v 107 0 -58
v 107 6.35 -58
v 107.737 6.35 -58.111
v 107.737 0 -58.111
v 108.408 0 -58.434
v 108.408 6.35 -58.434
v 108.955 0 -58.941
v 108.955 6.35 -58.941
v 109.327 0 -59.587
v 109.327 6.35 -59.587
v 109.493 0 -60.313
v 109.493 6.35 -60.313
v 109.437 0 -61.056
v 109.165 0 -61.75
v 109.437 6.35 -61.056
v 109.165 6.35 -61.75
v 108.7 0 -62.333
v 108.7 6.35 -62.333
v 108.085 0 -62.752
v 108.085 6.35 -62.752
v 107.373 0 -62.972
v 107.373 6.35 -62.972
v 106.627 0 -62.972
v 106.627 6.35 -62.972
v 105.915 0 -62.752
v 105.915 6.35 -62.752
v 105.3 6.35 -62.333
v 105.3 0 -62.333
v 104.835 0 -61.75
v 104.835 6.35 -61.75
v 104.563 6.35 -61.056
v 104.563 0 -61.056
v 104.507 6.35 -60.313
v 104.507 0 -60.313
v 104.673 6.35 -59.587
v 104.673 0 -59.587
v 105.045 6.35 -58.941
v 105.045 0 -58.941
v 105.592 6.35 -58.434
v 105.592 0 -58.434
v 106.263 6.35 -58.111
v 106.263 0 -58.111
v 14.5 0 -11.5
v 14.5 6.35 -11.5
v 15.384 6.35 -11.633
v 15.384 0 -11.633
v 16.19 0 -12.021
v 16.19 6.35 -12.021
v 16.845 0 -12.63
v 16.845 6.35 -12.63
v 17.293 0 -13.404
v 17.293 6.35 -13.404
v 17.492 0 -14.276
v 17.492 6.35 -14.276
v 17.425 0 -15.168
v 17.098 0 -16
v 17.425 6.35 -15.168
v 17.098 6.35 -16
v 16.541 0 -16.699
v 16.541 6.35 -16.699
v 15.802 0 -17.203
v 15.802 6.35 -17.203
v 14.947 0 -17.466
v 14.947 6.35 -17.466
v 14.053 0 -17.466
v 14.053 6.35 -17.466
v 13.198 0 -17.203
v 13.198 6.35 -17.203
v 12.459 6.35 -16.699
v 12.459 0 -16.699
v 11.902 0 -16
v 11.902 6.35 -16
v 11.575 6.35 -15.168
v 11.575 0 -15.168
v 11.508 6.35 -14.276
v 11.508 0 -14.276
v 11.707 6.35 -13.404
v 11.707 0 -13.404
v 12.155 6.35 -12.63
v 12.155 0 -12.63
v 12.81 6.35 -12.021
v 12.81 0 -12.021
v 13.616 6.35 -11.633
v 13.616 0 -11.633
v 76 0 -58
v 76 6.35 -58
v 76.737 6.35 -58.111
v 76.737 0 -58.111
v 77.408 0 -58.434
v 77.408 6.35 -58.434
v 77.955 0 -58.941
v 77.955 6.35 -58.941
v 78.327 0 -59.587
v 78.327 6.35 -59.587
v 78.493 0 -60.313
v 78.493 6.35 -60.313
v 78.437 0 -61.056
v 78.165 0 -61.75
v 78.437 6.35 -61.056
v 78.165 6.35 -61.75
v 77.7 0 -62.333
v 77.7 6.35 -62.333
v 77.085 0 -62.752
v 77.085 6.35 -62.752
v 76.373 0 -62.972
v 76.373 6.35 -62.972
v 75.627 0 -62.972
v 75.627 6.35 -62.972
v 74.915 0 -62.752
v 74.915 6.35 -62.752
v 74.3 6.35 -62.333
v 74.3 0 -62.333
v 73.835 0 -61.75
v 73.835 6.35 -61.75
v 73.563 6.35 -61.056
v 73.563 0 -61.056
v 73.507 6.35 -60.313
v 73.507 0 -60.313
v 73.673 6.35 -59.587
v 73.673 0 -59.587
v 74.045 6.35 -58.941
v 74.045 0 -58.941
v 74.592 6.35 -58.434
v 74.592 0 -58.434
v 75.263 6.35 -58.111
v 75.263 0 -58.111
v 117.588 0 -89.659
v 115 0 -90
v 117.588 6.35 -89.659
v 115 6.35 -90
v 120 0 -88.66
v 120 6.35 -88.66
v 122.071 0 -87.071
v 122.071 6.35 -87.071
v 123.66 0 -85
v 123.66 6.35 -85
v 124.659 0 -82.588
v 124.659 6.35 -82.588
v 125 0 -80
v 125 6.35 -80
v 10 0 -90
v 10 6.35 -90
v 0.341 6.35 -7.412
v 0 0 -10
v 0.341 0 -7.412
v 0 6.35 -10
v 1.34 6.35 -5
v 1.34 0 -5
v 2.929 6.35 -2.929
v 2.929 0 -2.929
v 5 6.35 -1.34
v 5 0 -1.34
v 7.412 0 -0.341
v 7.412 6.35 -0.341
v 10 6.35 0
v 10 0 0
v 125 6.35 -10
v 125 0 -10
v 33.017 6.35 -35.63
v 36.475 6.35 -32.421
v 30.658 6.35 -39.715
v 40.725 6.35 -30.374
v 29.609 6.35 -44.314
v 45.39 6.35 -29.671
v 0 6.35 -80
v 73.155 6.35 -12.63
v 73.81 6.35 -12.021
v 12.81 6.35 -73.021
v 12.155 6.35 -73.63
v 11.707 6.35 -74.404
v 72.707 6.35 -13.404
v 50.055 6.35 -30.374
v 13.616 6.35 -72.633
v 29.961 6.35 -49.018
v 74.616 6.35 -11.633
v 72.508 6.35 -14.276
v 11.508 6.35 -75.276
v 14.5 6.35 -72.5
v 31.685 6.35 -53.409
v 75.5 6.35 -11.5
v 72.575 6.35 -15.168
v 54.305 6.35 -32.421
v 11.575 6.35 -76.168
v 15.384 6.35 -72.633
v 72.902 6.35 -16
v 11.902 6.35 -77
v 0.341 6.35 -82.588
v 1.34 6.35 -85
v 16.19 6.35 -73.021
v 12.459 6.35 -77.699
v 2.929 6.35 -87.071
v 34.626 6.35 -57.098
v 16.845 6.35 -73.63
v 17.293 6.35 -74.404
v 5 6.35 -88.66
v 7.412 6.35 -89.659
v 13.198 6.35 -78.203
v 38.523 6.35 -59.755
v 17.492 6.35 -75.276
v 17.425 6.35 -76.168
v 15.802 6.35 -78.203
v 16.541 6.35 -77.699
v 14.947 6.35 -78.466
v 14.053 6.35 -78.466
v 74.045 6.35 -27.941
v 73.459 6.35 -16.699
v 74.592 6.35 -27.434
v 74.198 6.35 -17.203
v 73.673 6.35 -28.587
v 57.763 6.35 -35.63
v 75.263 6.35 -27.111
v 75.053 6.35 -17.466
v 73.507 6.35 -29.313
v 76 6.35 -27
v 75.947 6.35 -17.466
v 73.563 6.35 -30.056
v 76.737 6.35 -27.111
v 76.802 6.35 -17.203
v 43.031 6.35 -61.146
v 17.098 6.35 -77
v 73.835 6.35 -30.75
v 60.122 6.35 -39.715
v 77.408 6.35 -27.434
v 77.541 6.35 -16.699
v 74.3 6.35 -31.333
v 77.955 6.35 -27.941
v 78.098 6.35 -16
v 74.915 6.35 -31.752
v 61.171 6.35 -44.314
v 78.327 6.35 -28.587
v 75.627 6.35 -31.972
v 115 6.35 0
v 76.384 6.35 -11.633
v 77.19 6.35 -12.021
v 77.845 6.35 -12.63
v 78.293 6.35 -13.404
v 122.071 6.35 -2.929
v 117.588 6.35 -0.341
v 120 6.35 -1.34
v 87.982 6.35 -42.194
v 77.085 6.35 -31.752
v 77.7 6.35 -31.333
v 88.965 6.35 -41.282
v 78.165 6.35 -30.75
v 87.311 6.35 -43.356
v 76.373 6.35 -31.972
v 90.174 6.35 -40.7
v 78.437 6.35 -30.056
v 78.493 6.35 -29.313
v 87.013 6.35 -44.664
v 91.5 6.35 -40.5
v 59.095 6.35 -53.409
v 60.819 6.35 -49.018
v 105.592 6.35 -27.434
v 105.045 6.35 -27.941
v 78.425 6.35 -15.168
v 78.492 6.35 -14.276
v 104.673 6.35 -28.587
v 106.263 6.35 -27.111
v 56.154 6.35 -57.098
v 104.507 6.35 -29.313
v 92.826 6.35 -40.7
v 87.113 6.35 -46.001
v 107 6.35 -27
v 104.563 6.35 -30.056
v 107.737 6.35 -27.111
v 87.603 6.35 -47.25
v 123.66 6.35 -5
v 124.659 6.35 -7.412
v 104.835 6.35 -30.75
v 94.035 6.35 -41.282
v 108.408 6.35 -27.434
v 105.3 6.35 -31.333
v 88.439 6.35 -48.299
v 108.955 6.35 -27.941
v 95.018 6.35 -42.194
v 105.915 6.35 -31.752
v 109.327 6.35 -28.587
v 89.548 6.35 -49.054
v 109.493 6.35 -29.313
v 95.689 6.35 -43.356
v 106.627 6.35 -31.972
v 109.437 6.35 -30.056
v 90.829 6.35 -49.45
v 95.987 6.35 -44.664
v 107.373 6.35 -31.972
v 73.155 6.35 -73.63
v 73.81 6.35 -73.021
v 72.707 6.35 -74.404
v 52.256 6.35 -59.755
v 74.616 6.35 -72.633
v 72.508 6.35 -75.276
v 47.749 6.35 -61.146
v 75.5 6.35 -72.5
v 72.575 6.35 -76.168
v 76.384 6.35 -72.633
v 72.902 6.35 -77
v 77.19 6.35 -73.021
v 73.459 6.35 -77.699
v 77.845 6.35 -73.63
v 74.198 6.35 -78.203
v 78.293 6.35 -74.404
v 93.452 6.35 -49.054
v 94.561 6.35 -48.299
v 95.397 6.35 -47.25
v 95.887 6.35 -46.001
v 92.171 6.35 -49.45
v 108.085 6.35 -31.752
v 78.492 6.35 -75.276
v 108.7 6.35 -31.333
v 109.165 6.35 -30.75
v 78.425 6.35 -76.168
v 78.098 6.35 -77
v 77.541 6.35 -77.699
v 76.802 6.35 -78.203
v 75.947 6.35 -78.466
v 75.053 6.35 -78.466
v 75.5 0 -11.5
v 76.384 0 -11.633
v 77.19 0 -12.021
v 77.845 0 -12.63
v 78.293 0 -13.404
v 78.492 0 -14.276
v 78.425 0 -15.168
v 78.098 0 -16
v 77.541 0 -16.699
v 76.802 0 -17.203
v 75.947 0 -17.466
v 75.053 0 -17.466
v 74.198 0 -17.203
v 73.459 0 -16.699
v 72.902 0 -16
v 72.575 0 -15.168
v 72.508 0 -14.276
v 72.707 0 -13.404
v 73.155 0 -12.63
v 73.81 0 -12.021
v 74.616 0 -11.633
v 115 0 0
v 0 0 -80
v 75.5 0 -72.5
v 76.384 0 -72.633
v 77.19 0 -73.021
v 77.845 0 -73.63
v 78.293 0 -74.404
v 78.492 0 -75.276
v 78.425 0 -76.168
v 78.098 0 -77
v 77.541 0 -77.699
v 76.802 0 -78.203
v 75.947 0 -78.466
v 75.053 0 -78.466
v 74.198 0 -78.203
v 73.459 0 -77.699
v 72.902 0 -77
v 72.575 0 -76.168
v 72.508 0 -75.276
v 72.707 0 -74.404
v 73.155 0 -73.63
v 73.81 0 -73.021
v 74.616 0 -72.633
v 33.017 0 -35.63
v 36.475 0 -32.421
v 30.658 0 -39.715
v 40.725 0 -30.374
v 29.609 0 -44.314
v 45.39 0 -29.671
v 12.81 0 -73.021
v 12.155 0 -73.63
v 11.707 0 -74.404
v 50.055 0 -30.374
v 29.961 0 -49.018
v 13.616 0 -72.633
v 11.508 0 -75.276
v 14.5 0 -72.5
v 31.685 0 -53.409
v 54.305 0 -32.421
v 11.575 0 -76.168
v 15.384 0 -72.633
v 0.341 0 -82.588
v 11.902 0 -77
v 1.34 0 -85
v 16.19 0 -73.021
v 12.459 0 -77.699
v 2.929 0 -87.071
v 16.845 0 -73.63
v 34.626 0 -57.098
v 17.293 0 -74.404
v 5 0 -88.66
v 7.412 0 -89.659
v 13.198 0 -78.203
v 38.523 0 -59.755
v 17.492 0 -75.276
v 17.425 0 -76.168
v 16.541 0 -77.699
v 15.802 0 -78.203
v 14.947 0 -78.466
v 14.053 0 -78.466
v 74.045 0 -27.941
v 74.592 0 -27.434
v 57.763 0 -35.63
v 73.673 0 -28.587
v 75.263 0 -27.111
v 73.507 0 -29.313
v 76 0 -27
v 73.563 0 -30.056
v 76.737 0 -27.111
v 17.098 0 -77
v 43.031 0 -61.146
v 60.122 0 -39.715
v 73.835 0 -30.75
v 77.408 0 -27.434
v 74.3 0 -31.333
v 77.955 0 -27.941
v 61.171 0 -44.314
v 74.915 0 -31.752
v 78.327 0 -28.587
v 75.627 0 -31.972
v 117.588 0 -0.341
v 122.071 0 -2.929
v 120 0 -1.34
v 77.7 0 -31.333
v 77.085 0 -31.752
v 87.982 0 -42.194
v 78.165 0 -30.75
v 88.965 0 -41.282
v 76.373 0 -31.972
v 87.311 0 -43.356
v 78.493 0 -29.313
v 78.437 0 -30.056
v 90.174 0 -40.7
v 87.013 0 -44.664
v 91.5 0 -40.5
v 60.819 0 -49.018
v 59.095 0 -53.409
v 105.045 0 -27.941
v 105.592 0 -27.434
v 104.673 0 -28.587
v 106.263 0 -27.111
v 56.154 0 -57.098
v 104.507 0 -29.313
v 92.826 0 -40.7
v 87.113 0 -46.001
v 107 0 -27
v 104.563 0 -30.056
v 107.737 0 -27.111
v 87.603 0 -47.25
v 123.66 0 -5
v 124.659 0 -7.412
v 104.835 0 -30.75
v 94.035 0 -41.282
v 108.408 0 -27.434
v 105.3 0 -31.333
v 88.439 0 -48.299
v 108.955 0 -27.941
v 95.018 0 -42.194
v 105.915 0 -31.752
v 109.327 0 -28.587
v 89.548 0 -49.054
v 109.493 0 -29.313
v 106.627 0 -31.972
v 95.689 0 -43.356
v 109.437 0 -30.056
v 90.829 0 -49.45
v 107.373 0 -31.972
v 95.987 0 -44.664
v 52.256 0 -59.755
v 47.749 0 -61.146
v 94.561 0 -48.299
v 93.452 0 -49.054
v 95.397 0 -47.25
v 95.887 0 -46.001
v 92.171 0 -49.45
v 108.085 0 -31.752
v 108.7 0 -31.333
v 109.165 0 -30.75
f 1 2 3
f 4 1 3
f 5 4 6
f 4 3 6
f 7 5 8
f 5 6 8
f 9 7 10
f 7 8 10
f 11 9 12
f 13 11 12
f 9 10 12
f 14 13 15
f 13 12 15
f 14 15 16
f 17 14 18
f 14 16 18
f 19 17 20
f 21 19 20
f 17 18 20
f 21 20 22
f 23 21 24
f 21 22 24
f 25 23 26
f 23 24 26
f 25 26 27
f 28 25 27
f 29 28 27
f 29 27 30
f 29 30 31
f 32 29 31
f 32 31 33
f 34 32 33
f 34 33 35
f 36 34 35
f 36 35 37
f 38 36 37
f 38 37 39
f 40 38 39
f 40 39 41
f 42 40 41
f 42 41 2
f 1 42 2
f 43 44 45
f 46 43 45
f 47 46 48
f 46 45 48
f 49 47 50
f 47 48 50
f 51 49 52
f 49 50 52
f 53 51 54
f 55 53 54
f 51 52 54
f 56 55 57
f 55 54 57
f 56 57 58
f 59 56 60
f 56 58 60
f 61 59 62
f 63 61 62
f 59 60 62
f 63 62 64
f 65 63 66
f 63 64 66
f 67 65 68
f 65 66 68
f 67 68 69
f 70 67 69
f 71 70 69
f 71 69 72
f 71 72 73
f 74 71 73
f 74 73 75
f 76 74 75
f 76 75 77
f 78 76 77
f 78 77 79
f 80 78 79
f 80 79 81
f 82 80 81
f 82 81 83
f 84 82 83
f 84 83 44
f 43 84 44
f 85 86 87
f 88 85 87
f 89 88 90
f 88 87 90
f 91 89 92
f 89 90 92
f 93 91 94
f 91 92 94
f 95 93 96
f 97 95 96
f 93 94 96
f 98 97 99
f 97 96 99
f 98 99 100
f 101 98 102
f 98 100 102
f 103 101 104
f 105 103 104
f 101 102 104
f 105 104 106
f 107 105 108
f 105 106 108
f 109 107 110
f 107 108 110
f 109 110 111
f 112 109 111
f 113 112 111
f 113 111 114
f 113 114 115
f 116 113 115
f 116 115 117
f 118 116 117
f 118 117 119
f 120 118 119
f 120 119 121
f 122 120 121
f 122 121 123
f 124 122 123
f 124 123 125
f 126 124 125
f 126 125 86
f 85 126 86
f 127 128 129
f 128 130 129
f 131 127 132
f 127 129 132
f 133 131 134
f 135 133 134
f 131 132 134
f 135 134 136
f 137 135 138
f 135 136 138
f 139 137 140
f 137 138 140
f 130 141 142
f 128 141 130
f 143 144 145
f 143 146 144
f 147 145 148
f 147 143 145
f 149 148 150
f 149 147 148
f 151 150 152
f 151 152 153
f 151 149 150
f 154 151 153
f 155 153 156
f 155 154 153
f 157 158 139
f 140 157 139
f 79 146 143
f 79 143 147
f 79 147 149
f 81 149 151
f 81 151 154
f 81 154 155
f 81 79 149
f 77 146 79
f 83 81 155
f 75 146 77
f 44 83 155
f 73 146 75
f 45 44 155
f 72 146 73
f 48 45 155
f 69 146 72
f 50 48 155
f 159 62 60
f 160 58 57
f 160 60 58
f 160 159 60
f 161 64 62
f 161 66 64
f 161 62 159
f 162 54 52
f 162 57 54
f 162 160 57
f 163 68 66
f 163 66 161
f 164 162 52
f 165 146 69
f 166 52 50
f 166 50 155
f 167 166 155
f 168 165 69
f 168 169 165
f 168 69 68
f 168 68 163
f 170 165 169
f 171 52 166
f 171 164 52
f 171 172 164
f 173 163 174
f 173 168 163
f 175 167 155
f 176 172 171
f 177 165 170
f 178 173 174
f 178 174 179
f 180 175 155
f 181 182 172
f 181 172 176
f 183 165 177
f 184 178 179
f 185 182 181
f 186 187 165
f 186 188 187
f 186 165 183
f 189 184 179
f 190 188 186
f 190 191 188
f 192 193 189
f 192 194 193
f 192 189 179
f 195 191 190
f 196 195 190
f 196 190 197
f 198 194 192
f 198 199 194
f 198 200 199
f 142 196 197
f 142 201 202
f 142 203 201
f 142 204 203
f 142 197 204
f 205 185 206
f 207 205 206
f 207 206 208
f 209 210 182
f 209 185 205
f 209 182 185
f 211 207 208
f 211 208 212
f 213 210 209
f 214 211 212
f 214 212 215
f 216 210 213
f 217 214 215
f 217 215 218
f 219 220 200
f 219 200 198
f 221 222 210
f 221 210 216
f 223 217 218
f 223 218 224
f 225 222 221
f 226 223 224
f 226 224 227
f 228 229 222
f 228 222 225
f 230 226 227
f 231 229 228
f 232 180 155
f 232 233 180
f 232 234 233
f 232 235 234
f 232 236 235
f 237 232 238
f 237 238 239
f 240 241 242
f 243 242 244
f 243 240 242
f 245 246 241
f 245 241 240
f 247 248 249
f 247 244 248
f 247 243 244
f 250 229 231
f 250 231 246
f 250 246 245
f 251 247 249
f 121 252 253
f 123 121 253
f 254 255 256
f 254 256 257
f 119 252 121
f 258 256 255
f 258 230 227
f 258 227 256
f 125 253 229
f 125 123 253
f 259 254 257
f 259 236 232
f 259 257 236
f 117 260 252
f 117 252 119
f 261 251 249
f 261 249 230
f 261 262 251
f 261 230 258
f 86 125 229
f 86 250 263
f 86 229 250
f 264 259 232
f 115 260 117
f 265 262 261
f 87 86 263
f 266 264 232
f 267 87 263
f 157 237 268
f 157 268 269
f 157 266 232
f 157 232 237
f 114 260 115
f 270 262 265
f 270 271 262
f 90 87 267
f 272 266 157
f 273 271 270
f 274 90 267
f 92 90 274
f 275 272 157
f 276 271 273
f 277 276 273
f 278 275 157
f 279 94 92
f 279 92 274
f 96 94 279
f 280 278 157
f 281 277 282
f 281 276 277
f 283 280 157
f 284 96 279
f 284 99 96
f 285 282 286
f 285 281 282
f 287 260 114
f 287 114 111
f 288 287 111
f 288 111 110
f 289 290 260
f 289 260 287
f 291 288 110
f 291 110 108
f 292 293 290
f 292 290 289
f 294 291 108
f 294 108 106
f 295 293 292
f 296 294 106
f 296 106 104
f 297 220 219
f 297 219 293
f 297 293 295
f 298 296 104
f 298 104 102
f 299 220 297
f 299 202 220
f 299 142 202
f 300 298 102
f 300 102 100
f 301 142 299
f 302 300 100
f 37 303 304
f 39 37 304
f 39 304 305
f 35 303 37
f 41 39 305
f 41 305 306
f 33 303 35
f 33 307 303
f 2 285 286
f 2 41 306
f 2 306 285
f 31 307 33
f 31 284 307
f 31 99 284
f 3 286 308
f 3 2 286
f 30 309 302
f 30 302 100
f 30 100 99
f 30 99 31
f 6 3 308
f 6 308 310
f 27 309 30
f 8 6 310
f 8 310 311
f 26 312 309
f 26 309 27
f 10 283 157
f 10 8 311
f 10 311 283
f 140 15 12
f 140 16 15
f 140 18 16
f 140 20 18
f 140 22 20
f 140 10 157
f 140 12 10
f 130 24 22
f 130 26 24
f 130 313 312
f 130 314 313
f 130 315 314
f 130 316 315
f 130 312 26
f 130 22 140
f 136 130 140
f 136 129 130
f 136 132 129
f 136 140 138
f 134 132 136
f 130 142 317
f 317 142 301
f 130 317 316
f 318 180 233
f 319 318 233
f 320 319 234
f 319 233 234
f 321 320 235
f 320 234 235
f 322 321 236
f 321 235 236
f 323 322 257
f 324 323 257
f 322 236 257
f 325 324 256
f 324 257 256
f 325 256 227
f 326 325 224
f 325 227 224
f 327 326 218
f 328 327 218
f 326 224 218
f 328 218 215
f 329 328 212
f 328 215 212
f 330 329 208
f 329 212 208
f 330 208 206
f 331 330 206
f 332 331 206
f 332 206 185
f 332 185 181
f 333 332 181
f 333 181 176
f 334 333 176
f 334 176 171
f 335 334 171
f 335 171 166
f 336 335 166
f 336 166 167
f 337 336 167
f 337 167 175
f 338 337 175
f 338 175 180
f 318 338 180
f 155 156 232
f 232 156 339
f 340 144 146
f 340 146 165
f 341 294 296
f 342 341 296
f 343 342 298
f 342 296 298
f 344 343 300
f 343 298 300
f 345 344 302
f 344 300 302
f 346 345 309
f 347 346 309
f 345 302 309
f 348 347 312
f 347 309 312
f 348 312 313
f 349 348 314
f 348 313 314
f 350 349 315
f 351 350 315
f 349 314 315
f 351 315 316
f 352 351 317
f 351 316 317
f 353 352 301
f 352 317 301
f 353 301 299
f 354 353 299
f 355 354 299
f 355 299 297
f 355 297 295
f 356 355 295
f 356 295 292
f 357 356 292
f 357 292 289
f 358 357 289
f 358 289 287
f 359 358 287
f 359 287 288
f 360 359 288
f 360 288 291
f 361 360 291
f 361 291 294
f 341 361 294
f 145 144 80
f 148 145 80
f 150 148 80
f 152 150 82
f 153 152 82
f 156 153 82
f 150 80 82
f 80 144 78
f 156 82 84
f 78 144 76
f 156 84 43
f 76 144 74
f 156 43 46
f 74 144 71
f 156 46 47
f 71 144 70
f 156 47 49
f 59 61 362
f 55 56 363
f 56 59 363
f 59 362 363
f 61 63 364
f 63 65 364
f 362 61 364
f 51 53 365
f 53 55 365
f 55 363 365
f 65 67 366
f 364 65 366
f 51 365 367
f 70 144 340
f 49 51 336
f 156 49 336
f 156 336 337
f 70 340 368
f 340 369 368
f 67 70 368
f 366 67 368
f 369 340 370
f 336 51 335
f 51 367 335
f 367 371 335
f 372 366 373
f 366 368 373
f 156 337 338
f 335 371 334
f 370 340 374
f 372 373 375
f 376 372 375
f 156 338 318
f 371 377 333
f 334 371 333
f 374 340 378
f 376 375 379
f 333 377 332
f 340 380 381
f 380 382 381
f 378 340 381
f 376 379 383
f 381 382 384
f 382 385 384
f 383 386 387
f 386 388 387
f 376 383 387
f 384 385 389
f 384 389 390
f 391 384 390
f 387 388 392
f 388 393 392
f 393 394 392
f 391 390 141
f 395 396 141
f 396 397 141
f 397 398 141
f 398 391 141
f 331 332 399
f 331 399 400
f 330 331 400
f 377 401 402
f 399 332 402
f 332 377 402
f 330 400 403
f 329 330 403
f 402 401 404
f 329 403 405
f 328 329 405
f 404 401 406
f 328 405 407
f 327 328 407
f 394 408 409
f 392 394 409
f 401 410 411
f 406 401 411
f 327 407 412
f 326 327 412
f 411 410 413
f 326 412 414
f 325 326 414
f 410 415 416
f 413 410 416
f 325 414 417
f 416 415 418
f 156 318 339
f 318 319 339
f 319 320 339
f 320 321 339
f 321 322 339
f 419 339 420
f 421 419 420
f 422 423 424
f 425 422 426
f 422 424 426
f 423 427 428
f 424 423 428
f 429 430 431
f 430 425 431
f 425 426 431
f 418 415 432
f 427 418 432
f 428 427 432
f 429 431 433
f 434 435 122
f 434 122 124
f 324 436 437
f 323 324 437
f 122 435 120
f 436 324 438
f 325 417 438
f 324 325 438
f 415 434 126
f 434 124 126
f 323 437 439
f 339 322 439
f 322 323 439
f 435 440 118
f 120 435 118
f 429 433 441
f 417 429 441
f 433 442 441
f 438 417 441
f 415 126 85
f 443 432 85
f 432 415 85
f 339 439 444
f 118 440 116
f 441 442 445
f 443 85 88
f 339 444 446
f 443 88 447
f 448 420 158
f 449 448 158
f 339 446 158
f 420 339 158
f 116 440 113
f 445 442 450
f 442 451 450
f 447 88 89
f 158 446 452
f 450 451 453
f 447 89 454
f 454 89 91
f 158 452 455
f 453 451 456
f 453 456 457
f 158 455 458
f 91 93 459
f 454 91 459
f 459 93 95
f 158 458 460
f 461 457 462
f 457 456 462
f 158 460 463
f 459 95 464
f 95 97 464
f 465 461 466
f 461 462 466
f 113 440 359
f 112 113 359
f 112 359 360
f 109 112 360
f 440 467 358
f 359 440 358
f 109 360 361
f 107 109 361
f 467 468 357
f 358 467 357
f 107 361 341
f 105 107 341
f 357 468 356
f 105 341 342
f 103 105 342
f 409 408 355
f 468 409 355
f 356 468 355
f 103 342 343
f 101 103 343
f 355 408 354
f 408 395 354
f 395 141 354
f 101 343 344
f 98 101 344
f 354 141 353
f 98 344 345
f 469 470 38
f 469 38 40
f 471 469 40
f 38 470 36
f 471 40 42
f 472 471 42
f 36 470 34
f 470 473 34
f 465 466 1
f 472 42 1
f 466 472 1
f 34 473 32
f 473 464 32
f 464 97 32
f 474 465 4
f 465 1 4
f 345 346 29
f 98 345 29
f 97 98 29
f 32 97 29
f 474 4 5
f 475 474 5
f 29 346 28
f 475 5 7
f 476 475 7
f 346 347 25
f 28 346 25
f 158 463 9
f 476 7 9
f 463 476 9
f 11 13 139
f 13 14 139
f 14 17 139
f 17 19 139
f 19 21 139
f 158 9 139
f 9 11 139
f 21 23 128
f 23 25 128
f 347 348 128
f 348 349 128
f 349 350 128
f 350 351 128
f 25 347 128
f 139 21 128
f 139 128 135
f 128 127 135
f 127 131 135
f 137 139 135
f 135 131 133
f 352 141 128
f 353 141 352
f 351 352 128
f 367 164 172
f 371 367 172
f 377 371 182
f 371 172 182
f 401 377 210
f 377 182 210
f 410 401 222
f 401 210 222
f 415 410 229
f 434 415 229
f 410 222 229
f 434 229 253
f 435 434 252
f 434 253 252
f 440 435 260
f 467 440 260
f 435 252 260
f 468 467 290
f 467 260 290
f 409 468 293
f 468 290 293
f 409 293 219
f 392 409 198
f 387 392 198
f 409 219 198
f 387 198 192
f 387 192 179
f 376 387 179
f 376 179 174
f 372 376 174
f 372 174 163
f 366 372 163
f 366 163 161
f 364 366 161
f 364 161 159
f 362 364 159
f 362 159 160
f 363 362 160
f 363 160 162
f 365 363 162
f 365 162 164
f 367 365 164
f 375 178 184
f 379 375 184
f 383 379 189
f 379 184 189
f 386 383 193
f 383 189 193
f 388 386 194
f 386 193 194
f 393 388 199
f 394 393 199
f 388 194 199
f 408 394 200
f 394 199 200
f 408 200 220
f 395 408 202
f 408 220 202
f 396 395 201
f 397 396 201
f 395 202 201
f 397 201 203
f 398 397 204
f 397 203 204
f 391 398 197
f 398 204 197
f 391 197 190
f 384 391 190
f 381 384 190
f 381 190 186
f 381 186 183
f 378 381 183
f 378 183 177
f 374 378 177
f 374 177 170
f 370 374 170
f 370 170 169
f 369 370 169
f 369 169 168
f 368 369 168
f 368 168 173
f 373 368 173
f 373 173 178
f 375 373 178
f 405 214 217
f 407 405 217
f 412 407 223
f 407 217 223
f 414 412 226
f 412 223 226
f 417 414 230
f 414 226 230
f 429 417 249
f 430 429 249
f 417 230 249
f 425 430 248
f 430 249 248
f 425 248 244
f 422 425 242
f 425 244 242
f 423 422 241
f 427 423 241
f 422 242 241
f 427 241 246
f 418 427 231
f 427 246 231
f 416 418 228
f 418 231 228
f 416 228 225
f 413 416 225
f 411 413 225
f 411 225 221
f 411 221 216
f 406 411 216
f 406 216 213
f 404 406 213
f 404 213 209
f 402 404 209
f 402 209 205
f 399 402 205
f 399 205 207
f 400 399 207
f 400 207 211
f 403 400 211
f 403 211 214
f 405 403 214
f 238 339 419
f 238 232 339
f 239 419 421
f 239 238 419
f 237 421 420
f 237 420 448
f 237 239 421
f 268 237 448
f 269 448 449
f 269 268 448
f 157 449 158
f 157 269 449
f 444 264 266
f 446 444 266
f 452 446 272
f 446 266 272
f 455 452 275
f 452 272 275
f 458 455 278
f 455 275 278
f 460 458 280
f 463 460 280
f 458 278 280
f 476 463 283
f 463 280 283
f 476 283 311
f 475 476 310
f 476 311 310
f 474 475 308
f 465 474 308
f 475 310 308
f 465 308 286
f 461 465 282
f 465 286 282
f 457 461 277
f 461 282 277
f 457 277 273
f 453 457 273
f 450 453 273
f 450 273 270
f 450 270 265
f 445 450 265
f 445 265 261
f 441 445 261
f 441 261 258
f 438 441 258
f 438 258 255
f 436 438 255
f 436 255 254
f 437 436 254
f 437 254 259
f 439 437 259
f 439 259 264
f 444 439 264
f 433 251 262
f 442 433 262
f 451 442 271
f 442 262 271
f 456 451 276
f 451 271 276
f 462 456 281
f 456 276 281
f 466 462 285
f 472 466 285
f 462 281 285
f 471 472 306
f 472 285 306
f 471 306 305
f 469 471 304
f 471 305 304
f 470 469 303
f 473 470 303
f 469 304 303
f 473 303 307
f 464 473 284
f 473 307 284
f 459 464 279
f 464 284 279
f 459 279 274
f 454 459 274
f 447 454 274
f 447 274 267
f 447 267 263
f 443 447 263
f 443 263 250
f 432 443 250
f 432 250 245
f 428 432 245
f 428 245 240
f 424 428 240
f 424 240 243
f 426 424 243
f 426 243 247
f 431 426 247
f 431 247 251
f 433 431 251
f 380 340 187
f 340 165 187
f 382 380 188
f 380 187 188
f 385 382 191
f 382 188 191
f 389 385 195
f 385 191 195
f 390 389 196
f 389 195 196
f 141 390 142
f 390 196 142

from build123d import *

# Parameters (mm, degrees)
BOSS_EXTRUDE1_OUTLINE_W = 125
BOSS_EXTRUDE1_OUTLINE_H = 90
BOSS_EXTRUDE1_DEPTH     = 6.35
SKETCH2_R               = 3
CUT_EXTRUDE1_DEPTH      = 10
SKETCH3_R               = 4.5
SKETCH3_R_2             = 2.5
SERVO_CUTOUT_DEPTH      = 10
FILLET1_R               = 10
SKETCH4_R               = 15.825603453
CUT_EXTRUDE3_DEPTH      = 10


# Read off the part's stored shape, not the designer's step: Boss-Extrude1
with BuildPart() as part:
    # Boss-Extrude1 outline → Boss-Extrude1 (new body)
    with BuildSketch(Plane(origin=(0, 0, 0), x_dir=(1, 0, 0), z_dir=(0, 1, 0))):
        with Locations((62.5, 45)):
            Rectangle(BOSS_EXTRUDE1_OUTLINE_W, BOSS_EXTRUDE1_OUTLINE_H)
    extrude(amount=BOSS_EXTRUDE1_DEPTH)

    # Sketch2 → Cut-Extrude1 (cut)
    with BuildSketch(Plane(origin=(0, 6.35, 0), x_dir=(1, 0, 0), z_dir=(0, 1, 0))):
        with Locations(Location((14.5, 14.5, 0), (0, 0, 270))):
            Circle(SKETCH2_R)
        with Locations(Location((75.5, 14.5, 0), (0, 0, 270))):
            Circle(SKETCH2_R)
        with Locations(Location((75.5, 75.5, 0), (0, 0, 270))):
            Circle(SKETCH2_R)
        with Locations(Location((14.5, 75.5, 0), (0, 0, 270))):
            Circle(SKETCH2_R)
    extrude(amount=-CUT_EXTRUDE1_DEPTH, mode=Mode.SUBTRACT)

    # Sketch3 → Servo_Cutout (cut)
    with BuildSketch(Plane(origin=(0, 6.35, 0), x_dir=(1, 0, 0), z_dir=(0, 1, 0))):
        with Locations(Location((91.5, 45, 0), (0, 0, 270))):
            Circle(SKETCH3_R)
        with Locations(Location((107, 60.5, 0), (0, 0, 270))):
            Circle(SKETCH3_R_2)
        with Locations(Location((76, 60.5, 0), (0, 0, 270))):
            Circle(SKETCH3_R_2)
        with Locations(Location((76, 29.5, 0), (0, 0, 270))):
            Circle(SKETCH3_R_2)
        with Locations(Location((107, 29.5, 0), (0, 0, 270))):
            Circle(SKETCH3_R_2)
    extrude(amount=-SERVO_CUTOUT_DEPTH, mode=Mode.SUBTRACT)

    # Fillet1
    fillet1_edges = [part.edges().sort_by_distance(p)[0] for p in [
        (0, 3.175, -90),
        (125, 3.175, -90),
        (125, 3.175, 0),
        (0, 3.175, 0),
    ]]
    fillet(fillet1_edges, radius=FILLET1_R)

    # Sketch4 → Cut-Extrude3 (cut)
    with BuildSketch(Plane(origin=(0, 6.35, 0), x_dir=(1, 0, 0), z_dir=(0, 1, 0))):
        with Locations(Location((45.38988598, 45.496671395, 0), (0, 0, 270))):
            Circle(SKETCH4_R)
    extrude(amount=-CUT_EXTRUDE3_DEPTH, mode=Mode.SUBTRACT)


solid = part.part
